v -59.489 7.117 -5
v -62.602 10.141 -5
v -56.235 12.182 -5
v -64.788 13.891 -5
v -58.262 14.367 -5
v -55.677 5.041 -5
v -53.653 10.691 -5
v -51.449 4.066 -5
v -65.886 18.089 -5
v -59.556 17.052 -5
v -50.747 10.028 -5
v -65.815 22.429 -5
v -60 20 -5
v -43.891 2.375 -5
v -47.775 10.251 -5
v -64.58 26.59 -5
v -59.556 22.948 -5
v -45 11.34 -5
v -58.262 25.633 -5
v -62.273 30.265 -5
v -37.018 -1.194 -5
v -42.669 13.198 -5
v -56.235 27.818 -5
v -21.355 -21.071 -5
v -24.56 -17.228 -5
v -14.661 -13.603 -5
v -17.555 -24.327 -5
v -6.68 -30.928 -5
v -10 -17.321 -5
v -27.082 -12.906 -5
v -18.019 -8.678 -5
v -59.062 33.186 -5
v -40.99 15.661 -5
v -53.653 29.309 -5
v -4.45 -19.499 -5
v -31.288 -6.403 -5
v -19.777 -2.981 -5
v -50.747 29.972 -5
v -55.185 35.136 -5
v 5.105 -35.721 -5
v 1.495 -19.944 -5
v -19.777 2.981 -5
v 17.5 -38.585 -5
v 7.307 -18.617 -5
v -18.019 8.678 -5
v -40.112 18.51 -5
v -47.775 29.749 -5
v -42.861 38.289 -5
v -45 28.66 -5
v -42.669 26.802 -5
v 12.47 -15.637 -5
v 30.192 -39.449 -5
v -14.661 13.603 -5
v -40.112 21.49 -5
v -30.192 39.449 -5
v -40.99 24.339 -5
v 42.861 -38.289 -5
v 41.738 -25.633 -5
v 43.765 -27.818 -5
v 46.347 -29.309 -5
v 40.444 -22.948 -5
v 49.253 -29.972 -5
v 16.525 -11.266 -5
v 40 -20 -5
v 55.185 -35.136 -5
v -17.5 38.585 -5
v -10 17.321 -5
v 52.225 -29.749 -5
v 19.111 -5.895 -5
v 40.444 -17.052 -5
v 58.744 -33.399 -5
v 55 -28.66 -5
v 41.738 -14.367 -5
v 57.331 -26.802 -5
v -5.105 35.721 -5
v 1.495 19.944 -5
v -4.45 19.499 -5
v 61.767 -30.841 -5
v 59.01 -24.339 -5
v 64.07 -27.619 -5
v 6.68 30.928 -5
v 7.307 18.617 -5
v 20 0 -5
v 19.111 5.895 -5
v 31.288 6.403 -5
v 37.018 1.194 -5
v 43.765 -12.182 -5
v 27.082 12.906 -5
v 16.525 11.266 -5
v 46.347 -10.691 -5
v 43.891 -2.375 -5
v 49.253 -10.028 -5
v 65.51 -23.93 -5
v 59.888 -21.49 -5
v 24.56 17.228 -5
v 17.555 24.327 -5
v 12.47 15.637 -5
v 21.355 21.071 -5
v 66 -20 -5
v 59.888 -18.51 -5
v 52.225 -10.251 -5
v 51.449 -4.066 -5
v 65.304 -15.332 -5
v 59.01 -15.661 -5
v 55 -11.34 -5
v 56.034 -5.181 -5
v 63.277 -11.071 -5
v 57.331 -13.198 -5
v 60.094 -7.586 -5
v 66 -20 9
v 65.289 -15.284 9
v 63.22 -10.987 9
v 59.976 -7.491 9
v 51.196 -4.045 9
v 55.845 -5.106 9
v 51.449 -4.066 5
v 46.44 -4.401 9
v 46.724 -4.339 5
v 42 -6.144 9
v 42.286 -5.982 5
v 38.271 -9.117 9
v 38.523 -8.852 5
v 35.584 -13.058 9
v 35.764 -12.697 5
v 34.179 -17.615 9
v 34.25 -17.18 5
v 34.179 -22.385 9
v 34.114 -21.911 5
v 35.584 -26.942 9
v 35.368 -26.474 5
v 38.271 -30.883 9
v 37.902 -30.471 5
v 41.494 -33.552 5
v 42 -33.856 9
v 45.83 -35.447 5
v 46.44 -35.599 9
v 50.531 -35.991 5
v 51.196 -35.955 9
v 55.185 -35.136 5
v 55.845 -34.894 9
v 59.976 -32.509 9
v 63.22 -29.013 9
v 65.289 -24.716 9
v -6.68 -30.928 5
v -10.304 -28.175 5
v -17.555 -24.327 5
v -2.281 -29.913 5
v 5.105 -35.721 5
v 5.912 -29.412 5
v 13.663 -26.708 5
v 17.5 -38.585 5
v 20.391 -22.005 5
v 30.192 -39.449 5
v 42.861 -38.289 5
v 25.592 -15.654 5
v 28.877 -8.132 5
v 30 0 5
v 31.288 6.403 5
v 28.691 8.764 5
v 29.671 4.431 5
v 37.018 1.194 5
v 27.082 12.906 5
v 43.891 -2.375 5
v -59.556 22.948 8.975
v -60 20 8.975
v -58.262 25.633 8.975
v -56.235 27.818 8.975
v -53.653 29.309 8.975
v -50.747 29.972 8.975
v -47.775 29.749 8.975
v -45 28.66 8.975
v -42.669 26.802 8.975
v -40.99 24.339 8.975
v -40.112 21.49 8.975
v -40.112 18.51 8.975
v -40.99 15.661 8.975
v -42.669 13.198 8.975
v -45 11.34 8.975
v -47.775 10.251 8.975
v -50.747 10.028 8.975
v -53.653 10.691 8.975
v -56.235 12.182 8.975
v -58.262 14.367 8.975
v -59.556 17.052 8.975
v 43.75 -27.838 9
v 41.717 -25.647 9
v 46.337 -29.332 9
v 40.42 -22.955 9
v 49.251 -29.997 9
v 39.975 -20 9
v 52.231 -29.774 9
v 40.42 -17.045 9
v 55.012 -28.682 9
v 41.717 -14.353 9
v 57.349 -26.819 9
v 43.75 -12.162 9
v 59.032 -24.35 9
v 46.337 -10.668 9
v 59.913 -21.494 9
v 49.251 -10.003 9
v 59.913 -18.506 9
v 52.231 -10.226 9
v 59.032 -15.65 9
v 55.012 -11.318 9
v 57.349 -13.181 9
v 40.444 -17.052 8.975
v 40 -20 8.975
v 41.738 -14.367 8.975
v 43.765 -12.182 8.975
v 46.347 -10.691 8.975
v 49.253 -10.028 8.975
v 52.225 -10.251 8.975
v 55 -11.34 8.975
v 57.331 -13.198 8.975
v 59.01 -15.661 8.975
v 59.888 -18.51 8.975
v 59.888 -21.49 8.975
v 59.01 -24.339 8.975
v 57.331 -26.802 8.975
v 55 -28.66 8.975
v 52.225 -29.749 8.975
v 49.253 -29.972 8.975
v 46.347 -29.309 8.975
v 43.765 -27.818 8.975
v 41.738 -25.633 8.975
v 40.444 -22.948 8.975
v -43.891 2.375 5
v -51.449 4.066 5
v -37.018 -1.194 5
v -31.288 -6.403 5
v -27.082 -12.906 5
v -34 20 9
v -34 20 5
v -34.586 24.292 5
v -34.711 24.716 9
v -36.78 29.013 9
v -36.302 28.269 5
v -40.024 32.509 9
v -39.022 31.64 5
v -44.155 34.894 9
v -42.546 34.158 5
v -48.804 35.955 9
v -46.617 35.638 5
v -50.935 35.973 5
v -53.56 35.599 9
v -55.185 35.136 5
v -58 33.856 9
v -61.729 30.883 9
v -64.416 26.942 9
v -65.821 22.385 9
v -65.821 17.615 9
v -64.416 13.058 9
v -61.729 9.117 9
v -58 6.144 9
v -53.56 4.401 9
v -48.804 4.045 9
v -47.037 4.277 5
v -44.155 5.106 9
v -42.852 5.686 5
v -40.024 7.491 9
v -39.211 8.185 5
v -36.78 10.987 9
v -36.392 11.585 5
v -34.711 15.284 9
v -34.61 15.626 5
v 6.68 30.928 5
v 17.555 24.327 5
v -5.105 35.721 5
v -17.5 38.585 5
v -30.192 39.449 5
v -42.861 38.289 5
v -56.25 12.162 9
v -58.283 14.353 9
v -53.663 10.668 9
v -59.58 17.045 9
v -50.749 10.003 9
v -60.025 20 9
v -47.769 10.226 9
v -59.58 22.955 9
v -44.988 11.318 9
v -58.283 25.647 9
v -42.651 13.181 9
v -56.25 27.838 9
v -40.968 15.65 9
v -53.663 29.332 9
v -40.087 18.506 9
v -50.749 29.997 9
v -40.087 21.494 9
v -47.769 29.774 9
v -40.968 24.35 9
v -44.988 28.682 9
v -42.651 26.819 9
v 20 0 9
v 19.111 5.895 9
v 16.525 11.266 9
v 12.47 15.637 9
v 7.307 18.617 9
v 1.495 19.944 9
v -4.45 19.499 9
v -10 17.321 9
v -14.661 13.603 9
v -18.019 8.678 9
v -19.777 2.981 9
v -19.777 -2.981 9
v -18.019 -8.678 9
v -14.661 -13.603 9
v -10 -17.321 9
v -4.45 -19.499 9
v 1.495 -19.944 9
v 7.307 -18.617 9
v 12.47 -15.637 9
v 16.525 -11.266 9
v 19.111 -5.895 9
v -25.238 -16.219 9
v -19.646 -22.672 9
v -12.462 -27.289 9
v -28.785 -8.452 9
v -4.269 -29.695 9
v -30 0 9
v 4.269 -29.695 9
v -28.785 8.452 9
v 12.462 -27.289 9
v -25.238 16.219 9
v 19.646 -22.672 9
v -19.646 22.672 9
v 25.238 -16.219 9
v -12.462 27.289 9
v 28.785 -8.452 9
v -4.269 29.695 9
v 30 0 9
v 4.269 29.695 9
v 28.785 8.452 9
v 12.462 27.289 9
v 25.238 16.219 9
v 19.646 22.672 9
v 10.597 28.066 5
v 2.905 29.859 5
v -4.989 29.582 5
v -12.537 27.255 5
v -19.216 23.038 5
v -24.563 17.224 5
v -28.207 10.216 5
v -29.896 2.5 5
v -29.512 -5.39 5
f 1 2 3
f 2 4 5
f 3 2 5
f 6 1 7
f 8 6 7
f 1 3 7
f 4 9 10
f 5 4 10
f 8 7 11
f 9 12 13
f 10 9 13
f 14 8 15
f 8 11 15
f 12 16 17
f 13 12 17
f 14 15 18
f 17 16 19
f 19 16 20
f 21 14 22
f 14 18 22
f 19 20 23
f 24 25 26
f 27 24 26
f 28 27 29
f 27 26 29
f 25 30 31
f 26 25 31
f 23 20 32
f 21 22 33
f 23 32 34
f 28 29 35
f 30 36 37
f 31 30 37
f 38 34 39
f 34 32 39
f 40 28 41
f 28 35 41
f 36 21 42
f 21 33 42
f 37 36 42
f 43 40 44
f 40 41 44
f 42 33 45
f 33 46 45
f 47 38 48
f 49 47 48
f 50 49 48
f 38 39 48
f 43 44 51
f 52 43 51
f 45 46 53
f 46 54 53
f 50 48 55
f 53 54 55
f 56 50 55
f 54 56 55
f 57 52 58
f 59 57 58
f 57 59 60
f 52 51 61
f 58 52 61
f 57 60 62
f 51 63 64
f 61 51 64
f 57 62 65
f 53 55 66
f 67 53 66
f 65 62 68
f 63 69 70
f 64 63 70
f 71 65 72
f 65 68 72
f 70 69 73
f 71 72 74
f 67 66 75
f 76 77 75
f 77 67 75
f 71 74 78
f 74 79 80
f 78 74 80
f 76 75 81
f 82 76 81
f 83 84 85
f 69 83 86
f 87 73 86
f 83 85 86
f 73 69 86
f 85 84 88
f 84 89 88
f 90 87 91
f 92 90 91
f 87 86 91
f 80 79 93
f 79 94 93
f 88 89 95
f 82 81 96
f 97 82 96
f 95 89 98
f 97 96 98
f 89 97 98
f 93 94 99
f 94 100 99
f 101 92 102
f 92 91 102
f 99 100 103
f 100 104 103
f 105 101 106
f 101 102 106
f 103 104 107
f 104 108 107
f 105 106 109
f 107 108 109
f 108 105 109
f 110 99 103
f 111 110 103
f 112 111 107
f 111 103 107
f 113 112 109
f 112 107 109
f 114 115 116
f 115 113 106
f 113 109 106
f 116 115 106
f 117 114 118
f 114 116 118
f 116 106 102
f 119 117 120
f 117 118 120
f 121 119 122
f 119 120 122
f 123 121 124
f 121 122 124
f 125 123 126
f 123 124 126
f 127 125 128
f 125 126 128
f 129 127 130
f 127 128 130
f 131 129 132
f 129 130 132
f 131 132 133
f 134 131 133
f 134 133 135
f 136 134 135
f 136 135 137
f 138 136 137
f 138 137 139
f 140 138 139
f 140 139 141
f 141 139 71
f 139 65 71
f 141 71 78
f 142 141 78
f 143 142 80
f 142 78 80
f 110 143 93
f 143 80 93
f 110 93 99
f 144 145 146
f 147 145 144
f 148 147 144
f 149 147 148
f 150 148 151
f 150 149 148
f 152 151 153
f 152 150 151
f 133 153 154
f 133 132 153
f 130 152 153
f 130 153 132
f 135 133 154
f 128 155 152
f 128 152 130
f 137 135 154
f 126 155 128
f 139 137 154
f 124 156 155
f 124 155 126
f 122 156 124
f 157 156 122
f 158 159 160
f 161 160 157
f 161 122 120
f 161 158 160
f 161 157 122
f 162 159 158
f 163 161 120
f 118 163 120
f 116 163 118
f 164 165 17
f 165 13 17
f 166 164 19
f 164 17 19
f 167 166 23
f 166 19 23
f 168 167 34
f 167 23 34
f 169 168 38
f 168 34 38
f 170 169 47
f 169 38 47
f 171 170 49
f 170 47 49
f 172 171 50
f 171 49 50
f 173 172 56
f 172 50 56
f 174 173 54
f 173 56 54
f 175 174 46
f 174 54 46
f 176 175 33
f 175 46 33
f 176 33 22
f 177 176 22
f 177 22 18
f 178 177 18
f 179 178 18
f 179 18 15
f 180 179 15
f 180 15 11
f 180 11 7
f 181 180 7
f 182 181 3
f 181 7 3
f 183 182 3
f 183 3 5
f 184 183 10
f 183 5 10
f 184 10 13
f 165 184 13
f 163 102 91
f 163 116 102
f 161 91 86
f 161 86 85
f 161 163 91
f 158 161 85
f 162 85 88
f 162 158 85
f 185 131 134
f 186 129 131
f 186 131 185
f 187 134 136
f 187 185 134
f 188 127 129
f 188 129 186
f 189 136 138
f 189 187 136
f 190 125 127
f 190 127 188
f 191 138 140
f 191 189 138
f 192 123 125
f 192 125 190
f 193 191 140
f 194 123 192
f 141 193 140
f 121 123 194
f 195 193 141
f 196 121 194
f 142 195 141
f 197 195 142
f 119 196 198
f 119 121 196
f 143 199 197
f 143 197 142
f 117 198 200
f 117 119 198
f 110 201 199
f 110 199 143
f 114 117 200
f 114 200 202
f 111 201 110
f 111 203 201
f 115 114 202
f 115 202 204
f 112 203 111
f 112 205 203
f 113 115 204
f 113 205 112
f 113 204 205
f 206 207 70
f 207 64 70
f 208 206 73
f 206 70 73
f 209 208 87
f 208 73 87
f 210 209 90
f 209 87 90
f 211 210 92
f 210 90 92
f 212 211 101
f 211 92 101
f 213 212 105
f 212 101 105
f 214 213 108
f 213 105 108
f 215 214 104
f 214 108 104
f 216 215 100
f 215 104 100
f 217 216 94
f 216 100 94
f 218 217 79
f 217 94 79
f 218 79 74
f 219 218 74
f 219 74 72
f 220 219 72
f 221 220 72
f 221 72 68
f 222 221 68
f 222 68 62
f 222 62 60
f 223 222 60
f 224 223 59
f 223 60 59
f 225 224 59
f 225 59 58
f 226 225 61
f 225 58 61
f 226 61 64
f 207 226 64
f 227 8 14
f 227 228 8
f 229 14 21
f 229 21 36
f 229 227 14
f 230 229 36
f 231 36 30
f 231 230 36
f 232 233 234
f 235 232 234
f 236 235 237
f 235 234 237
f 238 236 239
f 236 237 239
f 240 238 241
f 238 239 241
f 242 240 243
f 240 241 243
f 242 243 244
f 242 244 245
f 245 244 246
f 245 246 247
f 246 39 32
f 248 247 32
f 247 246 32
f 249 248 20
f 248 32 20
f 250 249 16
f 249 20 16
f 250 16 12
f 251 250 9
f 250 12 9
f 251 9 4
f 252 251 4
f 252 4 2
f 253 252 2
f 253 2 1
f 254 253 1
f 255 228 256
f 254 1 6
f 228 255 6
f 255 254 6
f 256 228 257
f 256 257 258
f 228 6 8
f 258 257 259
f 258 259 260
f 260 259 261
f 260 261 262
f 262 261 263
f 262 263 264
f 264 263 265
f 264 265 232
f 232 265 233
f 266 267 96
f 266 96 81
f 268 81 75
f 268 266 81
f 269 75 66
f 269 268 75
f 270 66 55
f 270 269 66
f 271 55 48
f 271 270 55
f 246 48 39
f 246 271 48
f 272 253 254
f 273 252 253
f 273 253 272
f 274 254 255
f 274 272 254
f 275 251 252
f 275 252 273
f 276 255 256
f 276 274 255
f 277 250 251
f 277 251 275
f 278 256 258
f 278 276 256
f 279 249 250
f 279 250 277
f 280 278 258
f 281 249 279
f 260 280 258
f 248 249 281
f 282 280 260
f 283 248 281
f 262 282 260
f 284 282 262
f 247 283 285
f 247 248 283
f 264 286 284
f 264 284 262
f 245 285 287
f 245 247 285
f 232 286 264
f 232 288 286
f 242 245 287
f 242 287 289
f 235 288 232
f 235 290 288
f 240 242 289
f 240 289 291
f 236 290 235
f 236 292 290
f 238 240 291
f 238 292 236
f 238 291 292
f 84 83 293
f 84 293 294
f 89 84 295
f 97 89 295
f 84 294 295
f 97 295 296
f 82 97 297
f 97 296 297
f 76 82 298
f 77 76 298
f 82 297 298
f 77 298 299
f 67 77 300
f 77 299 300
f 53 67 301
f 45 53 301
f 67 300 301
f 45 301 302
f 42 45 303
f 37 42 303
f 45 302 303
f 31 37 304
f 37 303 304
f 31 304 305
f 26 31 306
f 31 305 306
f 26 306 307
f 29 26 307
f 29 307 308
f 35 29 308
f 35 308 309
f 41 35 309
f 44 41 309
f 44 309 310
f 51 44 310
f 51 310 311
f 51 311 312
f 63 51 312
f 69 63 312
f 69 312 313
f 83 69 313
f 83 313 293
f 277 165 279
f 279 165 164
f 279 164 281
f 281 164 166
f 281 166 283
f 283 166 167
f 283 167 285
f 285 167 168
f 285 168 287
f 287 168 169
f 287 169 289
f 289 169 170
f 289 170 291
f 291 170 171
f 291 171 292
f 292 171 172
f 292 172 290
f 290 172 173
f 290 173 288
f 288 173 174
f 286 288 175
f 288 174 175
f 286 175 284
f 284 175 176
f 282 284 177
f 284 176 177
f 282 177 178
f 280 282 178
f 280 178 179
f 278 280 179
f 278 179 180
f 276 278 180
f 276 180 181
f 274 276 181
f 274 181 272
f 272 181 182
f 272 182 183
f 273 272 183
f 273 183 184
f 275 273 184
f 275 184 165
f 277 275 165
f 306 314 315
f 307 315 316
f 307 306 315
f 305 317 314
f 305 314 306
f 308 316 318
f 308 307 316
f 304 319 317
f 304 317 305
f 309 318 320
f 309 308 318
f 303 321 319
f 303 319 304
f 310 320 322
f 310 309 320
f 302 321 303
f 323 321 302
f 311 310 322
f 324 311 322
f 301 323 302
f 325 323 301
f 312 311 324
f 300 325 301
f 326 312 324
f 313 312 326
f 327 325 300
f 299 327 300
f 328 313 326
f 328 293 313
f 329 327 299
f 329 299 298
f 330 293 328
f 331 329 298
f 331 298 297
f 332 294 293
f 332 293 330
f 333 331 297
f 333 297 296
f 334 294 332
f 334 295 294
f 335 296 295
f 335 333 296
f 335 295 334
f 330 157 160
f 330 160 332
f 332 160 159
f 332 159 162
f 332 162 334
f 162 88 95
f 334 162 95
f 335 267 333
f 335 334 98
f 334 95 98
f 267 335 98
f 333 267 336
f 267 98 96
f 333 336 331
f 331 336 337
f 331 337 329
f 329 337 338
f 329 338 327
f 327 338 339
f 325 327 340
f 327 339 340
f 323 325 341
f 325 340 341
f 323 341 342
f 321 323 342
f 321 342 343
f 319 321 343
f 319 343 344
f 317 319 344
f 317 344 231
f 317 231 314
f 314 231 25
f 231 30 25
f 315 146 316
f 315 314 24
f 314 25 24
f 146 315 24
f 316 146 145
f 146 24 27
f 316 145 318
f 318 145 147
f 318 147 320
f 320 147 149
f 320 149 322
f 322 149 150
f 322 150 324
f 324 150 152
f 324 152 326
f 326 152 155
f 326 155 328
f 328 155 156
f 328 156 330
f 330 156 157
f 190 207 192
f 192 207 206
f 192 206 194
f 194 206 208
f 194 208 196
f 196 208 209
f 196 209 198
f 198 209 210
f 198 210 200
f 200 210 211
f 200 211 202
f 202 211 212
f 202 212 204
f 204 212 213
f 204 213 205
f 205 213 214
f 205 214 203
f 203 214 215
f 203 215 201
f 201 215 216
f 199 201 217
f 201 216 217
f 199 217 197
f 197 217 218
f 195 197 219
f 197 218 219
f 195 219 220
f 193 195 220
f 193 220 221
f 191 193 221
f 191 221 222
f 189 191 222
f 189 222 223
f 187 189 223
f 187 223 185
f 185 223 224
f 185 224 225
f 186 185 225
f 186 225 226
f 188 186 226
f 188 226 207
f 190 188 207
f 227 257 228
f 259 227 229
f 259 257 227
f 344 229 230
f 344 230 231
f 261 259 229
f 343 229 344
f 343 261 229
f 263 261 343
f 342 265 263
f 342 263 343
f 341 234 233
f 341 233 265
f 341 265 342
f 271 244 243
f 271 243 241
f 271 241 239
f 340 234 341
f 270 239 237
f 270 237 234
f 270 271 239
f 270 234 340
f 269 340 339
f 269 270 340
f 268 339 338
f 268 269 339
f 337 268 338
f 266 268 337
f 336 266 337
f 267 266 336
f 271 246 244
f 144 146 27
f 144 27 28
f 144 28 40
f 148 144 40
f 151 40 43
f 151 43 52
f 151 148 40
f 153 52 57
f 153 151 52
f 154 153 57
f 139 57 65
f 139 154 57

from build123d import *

# Parameters (mm, degrees)
ESTRUSIONE_ESTRUSIONE1_START = -5
SCHIZZO1_R                   = 16
ESTRUSIONE_ESTRUSIONE1_DEPTH = 14
ESTRUSIONE_ESTRUSIONE3_START = -5
SCHIZZO1_4_R                 = 16
ESTRUSIONE_ESTRUSIONE3_DEPTH = 14
ESTRUSIONE_ESTRUSIONE5_START = -5
SCHIZZO1_7_R                 = 30
ESTRUSIONE_ESTRUSIONE5_DEPTH = 14
ESTRUSIONE_ESTRUSIONE6_DEPTH = 5
ESTRUSIONE_ESTRUSIONE7_DEPTH = 5
FORO_20_0_20_1_D             = 20
FORO_20_0_20_1_CSINK_D       = 20.05
FORO_20_0_20_1_CSINK_ANGLE   = 90
TAGLIO_ESTRUSIONE1_START     = 9
SCHIZZO1_13_R                = 20
TAGLIO_ESTRUSIONE1_DEPTH     = 87.418617561


with BuildPart() as part:
    # Schizzo1 → Estrusione-Estrusione1 (new body)
    with BuildSketch(Plane.XY.offset(ESTRUSIONE_ESTRUSIONE1_START)):
        with Locations((-50, 20)):
            Circle(SCHIZZO1_R)
    extrude(amount=ESTRUSIONE_ESTRUSIONE1_DEPTH)



with BuildPart() as body_2:
    # Schizzo1<4> → Estrusione-Estrusione3 (new body)
    with BuildSketch(Plane.XY.offset(ESTRUSIONE_ESTRUSIONE3_START)):
        with Locations((50, -20)):
            Circle(SCHIZZO1_4_R)
    extrude(amount=ESTRUSIONE_ESTRUSIONE3_DEPTH)



with BuildPart() as body_3:
    # Schizzo1<7> → Estrusione-Estrusione5 (new body)
    with BuildSketch(Plane.XY.offset(ESTRUSIONE_ESTRUSIONE5_START)):
        Circle(SCHIZZO1_7_R)
    extrude(amount=ESTRUSIONE_ESTRUSIONE5_DEPTH)


with BuildPart() as body_2_1:
    add(body_2.part)

    add(body_3.part)  # Estrusione-Estrusione6 merges body 3
    # Schizzo1<11> → Estrusione-Estrusione6 (add, symmetric)
    with BuildSketch(Plane.XY):
        with BuildLine():
            ThreePointArc((27.082221172, 12.905552929), (29.26146472, 6.61563923), (30, 0))
            ThreePointArc((30, 0), (13.662924482, -26.708135364), (-17.554966307, -24.327415768))
            ThreePointArc((-17.554966307, -24.327415768), (17.499627211, -38.585427044), (55.185430705, -35.136423237))
            ThreePointArc((55.185430705, -35.136423237), (34.114481769, -21.910578587), (51.448501685, -4.06570231))
            ThreePointArc((51.448501685, -4.06570231), (37.018349838, 1.193804792), (27.082221172, 12.905552929))
        make_face()
    extrude(amount=ESTRUSIONE_ESTRUSIONE6_DEPTH, both=True)


with BuildPart() as part_1:
    add(part.part)

    add(body_2_1.part)  # Estrusione-Estrusione7 merges body 2
    # Schizzo1<12> → Estrusione-Estrusione7 (add, symmetric)
    with BuildSketch(Plane.XY):
        with BuildLine():
            ThreePointArc((-27.082221172, -12.905552929), (-19.216284557, 23.037673664), (17.554968706, 24.327414037))
            ThreePointArc((17.554968706, 24.327414037), (-17.499625748, 38.585426826), (-55.185430705, 35.136423237))
            ThreePointArc((-55.185430705, 35.136423237), (-40.698572456, 33.018580785), (-34, 20))
            ThreePointArc((-34, 20), (-39.210561343, 8.185262869), (-51.448501685, 4.06570231))
            ThreePointArc((-51.448501685, 4.06570231), (-37.018349838, -1.193804792), (-27.082221172, -12.905552929))
        make_face()
    extrude(amount=ESTRUSIONE_ESTRUSIONE7_DEPTH, both=True)

    # Foro Ø20.0 (20)-1 (through all)
    with Locations(Plane(origin=(-50, 20, 9), x_dir=(1, 0, 0), z_dir=(0, 0, 1))):
        with Locations((0, 0), (100, -40)):
            CounterSinkHole(FORO_20_0_20_1_D / 2, FORO_20_0_20_1_CSINK_D / 2, counter_sink_angle=FORO_20_0_20_1_CSINK_ANGLE)

    # Schizzo1<13> → Taglio-Estrusione1 (cut, through all)
    with BuildSketch(Plane.XY.offset(TAGLIO_ESTRUSIONE1_START)):
        Circle(SCHIZZO1_13_R)
    extrude(amount=-TAGLIO_ESTRUSIONE1_DEPTH, mode=Mode.SUBTRACT)


solid = part_1.part
